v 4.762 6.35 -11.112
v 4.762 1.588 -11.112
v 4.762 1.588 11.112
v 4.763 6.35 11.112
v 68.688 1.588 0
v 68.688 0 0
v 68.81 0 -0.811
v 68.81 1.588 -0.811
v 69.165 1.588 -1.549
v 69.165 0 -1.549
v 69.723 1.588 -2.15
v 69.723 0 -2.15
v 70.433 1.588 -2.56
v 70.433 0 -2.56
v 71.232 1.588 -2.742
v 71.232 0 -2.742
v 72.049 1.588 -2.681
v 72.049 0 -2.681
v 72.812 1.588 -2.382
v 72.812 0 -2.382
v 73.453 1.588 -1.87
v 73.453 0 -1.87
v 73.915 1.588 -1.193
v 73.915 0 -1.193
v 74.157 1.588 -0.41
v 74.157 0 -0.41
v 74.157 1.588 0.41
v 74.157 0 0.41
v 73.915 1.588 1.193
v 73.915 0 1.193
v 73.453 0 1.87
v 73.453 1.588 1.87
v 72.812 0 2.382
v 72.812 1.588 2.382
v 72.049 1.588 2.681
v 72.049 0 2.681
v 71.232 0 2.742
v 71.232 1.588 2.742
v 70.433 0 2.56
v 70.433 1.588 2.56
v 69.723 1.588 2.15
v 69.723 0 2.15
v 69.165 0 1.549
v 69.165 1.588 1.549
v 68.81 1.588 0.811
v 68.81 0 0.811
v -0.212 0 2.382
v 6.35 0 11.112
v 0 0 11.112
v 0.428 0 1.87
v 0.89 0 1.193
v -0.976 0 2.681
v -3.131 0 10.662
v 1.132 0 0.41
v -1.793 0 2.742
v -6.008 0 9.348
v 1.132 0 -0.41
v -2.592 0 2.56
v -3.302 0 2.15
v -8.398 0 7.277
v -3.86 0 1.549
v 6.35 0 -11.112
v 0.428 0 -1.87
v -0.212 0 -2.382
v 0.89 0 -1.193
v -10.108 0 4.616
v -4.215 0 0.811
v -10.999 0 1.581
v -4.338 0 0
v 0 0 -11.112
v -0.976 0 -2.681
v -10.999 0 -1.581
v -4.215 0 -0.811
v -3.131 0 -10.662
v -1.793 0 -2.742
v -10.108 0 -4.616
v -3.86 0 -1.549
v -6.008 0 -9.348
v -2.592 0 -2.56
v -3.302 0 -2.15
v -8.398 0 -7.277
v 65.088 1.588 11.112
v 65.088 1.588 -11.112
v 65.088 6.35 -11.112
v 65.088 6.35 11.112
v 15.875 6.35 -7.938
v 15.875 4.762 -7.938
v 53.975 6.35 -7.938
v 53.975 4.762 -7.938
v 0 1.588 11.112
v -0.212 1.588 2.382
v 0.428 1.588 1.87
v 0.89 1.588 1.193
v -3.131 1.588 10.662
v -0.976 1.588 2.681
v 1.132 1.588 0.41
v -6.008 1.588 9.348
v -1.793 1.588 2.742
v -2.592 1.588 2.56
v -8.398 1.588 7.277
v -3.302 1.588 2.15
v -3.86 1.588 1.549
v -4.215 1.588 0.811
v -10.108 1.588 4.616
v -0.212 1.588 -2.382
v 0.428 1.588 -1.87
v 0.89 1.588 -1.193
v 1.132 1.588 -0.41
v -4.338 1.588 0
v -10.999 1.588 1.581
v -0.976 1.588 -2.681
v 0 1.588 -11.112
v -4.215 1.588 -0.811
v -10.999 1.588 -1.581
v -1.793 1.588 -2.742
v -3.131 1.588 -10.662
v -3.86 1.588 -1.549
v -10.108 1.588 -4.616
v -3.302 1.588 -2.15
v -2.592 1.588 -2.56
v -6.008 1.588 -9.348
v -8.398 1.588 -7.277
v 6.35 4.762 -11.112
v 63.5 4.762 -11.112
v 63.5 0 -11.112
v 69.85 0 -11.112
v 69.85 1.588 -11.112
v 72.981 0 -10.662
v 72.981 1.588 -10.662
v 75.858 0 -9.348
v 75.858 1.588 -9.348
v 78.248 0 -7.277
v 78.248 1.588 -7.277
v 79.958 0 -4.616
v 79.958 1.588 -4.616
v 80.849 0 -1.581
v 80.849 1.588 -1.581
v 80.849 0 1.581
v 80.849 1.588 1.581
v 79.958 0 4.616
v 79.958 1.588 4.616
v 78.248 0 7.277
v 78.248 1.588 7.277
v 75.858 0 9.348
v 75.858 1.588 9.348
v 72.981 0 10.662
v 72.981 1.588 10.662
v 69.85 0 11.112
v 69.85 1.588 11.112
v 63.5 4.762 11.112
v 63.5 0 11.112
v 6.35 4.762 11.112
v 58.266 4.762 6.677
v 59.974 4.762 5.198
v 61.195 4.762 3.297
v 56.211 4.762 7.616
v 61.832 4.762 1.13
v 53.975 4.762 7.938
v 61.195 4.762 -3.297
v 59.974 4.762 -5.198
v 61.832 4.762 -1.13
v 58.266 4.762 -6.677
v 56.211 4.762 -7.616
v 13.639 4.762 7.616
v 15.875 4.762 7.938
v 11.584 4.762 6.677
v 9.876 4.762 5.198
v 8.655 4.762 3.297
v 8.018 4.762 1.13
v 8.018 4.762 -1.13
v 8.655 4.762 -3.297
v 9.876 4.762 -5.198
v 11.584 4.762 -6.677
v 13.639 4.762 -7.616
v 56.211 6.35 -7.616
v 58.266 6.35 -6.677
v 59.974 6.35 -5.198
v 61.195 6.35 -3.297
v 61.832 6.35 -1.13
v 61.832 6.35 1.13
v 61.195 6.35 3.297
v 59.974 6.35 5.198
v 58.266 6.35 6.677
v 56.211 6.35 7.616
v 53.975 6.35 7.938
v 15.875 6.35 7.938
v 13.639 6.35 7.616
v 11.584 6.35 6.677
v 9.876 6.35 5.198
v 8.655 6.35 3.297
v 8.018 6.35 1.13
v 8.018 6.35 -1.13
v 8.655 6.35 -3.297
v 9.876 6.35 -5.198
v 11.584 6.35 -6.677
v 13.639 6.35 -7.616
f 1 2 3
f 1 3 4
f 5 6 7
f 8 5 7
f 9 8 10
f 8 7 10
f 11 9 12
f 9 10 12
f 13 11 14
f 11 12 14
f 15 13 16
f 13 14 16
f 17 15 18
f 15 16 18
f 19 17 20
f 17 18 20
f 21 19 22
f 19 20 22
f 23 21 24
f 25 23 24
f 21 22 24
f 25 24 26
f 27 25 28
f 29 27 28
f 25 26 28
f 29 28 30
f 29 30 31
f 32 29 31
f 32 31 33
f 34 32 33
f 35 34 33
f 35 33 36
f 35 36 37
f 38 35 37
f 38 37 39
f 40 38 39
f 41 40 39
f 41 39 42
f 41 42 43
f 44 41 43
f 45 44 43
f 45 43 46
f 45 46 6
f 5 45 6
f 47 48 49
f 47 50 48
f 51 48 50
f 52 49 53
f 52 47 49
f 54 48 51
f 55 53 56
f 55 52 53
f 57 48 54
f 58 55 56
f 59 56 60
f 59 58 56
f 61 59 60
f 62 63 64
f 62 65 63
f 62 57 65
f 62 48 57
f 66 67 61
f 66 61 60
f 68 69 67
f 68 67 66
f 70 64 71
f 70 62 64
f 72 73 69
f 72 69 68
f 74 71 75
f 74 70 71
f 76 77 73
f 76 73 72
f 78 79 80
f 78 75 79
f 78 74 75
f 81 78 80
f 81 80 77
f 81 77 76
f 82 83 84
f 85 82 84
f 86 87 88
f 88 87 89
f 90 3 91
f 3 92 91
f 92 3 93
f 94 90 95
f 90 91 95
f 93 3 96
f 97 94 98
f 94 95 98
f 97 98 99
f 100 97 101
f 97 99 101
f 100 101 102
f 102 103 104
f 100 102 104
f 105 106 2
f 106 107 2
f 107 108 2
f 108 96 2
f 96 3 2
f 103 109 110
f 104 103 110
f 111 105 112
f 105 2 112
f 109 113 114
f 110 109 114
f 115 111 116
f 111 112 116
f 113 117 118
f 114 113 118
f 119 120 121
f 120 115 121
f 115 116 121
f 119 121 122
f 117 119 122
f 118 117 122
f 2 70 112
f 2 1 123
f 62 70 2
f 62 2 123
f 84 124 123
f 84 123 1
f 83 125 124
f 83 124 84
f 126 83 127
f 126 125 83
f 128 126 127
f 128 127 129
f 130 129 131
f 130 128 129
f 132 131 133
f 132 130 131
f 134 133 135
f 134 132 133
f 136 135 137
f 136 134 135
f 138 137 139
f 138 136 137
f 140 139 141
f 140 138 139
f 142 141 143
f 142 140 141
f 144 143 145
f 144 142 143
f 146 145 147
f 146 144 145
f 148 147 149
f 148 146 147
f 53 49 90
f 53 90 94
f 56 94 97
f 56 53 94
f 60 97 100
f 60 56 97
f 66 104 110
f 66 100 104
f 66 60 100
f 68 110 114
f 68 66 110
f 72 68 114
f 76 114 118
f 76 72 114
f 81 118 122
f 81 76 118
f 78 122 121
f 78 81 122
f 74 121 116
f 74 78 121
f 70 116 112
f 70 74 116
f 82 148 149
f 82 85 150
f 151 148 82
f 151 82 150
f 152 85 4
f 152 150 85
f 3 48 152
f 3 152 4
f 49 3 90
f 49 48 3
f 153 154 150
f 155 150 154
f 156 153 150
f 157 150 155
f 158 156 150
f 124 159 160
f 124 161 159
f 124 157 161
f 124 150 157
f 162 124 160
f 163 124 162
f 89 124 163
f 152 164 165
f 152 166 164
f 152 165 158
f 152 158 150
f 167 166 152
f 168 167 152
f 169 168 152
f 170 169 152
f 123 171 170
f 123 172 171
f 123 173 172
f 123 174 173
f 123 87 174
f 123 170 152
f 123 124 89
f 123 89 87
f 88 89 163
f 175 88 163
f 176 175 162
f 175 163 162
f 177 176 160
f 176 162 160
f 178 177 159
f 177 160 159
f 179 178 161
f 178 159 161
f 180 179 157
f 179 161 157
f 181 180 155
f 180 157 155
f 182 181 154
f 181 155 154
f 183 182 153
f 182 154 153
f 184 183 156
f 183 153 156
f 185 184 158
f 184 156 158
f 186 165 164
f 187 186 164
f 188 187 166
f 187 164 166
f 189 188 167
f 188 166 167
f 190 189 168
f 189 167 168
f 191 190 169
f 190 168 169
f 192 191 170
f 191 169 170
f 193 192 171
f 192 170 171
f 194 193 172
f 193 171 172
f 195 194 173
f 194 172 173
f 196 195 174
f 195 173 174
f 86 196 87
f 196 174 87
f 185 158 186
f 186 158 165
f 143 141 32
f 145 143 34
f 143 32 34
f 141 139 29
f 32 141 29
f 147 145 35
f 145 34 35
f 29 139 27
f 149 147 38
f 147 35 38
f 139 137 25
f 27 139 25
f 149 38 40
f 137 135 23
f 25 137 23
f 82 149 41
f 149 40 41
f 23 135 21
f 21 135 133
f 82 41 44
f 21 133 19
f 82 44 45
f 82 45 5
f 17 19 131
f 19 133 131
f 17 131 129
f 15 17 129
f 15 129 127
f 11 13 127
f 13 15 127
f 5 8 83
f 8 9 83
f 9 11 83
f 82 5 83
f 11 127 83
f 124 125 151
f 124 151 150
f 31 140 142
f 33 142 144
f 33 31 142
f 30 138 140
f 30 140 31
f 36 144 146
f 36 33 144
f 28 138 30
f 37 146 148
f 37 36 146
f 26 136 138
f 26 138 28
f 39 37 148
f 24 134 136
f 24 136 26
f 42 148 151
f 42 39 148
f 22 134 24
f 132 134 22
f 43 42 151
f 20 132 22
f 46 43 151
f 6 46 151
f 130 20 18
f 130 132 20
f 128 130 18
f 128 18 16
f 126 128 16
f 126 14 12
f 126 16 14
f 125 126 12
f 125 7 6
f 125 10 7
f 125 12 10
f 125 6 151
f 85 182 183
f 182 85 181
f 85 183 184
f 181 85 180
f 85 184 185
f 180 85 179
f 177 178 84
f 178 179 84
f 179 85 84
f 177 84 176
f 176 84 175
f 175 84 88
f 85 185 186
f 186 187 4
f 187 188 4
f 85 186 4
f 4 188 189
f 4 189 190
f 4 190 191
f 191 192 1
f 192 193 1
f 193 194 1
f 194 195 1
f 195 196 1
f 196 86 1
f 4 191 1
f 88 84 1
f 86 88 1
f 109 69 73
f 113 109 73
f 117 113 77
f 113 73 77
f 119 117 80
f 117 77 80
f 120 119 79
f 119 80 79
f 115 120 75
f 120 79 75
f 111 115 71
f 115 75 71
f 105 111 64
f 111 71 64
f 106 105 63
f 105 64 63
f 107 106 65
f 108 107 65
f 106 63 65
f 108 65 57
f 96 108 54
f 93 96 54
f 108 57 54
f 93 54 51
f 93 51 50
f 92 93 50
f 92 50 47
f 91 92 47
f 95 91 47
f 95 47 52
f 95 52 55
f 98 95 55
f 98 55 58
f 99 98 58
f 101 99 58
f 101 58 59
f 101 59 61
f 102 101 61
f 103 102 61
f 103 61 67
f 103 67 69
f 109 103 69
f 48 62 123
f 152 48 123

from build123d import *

# Parameters (mm, degrees)
BOSS_EXTRUDE1_DEPTH  = 6.35
SKETCH6_W            = 57.15
SKETCH6_H            = 4.7625
SKETCH6_W_2          = 15.875
CUT_EXTRUDE1_DEPTH   = 85.197384349
M5_CLEARANCE_HOLE1_D = 5.5


with BuildPart() as part:
    # Sketch2 → Boss-Extrude1 (new body)
    with BuildSketch(Plane(origin=(0, 0, 0), x_dir=(1, 0, 0), z_dir=(0, 1, 0))):
        with BuildLine():
            Line((0, 11.1125), (69.85, 11.1125))
            ThreePointArc((69.85, 11.1125), (80.9625, 0), (69.85, -11.1125))
            Line((69.85, -11.1125), (0, -11.1125))
            ThreePointArc((0, -11.1125), (-11.1125, 0), (0, 11.1125))
        make_face()
        with BuildLine():
            Line((15.875, 7.9375), (53.975, 7.9375))
            ThreePointArc((53.975, 7.9375), (61.9125, 0), (53.975, -7.9375))
            Line((53.975, -7.9375), (15.875, -7.9375))
            ThreePointArc((15.875, -7.9375), (7.9375, 0), (15.875, 7.9375))
        make_face(mode=Mode.SUBTRACT)
    extrude(amount=BOSS_EXTRUDE1_DEPTH)

    # Sketch6 → Cut-Extrude1 (cut, through all)
    with BuildSketch(Plane(origin=(0, 0, -11.1125), x_dir=(-1, 0, 0), z_dir=(0, 0, -1))):
        with Locations((-34.925, 2.38125)):
            Rectangle(SKETCH6_W, SKETCH6_H)
        with Locations((-73.025, 3.96875)):
            Rectangle(SKETCH6_W_2, SKETCH6_H)
        with Locations((3.175, 3.96875)):
            Rectangle(SKETCH6_W_2, SKETCH6_H)
    extrude(amount=-CUT_EXTRUDE1_DEPTH, mode=Mode.SUBTRACT)

    # M5 Clearance Hole1 (through all)
    with Locations(Plane(origin=(0, 1.5875, 0), x_dir=(1, 0, 0), z_dir=(0, 1, 0))):
        with Locations((-1.5875, 0), (71.4375, 0)):
            Hole(M5_CLEARANCE_HOLE1_D / 2)


solid = part.part
